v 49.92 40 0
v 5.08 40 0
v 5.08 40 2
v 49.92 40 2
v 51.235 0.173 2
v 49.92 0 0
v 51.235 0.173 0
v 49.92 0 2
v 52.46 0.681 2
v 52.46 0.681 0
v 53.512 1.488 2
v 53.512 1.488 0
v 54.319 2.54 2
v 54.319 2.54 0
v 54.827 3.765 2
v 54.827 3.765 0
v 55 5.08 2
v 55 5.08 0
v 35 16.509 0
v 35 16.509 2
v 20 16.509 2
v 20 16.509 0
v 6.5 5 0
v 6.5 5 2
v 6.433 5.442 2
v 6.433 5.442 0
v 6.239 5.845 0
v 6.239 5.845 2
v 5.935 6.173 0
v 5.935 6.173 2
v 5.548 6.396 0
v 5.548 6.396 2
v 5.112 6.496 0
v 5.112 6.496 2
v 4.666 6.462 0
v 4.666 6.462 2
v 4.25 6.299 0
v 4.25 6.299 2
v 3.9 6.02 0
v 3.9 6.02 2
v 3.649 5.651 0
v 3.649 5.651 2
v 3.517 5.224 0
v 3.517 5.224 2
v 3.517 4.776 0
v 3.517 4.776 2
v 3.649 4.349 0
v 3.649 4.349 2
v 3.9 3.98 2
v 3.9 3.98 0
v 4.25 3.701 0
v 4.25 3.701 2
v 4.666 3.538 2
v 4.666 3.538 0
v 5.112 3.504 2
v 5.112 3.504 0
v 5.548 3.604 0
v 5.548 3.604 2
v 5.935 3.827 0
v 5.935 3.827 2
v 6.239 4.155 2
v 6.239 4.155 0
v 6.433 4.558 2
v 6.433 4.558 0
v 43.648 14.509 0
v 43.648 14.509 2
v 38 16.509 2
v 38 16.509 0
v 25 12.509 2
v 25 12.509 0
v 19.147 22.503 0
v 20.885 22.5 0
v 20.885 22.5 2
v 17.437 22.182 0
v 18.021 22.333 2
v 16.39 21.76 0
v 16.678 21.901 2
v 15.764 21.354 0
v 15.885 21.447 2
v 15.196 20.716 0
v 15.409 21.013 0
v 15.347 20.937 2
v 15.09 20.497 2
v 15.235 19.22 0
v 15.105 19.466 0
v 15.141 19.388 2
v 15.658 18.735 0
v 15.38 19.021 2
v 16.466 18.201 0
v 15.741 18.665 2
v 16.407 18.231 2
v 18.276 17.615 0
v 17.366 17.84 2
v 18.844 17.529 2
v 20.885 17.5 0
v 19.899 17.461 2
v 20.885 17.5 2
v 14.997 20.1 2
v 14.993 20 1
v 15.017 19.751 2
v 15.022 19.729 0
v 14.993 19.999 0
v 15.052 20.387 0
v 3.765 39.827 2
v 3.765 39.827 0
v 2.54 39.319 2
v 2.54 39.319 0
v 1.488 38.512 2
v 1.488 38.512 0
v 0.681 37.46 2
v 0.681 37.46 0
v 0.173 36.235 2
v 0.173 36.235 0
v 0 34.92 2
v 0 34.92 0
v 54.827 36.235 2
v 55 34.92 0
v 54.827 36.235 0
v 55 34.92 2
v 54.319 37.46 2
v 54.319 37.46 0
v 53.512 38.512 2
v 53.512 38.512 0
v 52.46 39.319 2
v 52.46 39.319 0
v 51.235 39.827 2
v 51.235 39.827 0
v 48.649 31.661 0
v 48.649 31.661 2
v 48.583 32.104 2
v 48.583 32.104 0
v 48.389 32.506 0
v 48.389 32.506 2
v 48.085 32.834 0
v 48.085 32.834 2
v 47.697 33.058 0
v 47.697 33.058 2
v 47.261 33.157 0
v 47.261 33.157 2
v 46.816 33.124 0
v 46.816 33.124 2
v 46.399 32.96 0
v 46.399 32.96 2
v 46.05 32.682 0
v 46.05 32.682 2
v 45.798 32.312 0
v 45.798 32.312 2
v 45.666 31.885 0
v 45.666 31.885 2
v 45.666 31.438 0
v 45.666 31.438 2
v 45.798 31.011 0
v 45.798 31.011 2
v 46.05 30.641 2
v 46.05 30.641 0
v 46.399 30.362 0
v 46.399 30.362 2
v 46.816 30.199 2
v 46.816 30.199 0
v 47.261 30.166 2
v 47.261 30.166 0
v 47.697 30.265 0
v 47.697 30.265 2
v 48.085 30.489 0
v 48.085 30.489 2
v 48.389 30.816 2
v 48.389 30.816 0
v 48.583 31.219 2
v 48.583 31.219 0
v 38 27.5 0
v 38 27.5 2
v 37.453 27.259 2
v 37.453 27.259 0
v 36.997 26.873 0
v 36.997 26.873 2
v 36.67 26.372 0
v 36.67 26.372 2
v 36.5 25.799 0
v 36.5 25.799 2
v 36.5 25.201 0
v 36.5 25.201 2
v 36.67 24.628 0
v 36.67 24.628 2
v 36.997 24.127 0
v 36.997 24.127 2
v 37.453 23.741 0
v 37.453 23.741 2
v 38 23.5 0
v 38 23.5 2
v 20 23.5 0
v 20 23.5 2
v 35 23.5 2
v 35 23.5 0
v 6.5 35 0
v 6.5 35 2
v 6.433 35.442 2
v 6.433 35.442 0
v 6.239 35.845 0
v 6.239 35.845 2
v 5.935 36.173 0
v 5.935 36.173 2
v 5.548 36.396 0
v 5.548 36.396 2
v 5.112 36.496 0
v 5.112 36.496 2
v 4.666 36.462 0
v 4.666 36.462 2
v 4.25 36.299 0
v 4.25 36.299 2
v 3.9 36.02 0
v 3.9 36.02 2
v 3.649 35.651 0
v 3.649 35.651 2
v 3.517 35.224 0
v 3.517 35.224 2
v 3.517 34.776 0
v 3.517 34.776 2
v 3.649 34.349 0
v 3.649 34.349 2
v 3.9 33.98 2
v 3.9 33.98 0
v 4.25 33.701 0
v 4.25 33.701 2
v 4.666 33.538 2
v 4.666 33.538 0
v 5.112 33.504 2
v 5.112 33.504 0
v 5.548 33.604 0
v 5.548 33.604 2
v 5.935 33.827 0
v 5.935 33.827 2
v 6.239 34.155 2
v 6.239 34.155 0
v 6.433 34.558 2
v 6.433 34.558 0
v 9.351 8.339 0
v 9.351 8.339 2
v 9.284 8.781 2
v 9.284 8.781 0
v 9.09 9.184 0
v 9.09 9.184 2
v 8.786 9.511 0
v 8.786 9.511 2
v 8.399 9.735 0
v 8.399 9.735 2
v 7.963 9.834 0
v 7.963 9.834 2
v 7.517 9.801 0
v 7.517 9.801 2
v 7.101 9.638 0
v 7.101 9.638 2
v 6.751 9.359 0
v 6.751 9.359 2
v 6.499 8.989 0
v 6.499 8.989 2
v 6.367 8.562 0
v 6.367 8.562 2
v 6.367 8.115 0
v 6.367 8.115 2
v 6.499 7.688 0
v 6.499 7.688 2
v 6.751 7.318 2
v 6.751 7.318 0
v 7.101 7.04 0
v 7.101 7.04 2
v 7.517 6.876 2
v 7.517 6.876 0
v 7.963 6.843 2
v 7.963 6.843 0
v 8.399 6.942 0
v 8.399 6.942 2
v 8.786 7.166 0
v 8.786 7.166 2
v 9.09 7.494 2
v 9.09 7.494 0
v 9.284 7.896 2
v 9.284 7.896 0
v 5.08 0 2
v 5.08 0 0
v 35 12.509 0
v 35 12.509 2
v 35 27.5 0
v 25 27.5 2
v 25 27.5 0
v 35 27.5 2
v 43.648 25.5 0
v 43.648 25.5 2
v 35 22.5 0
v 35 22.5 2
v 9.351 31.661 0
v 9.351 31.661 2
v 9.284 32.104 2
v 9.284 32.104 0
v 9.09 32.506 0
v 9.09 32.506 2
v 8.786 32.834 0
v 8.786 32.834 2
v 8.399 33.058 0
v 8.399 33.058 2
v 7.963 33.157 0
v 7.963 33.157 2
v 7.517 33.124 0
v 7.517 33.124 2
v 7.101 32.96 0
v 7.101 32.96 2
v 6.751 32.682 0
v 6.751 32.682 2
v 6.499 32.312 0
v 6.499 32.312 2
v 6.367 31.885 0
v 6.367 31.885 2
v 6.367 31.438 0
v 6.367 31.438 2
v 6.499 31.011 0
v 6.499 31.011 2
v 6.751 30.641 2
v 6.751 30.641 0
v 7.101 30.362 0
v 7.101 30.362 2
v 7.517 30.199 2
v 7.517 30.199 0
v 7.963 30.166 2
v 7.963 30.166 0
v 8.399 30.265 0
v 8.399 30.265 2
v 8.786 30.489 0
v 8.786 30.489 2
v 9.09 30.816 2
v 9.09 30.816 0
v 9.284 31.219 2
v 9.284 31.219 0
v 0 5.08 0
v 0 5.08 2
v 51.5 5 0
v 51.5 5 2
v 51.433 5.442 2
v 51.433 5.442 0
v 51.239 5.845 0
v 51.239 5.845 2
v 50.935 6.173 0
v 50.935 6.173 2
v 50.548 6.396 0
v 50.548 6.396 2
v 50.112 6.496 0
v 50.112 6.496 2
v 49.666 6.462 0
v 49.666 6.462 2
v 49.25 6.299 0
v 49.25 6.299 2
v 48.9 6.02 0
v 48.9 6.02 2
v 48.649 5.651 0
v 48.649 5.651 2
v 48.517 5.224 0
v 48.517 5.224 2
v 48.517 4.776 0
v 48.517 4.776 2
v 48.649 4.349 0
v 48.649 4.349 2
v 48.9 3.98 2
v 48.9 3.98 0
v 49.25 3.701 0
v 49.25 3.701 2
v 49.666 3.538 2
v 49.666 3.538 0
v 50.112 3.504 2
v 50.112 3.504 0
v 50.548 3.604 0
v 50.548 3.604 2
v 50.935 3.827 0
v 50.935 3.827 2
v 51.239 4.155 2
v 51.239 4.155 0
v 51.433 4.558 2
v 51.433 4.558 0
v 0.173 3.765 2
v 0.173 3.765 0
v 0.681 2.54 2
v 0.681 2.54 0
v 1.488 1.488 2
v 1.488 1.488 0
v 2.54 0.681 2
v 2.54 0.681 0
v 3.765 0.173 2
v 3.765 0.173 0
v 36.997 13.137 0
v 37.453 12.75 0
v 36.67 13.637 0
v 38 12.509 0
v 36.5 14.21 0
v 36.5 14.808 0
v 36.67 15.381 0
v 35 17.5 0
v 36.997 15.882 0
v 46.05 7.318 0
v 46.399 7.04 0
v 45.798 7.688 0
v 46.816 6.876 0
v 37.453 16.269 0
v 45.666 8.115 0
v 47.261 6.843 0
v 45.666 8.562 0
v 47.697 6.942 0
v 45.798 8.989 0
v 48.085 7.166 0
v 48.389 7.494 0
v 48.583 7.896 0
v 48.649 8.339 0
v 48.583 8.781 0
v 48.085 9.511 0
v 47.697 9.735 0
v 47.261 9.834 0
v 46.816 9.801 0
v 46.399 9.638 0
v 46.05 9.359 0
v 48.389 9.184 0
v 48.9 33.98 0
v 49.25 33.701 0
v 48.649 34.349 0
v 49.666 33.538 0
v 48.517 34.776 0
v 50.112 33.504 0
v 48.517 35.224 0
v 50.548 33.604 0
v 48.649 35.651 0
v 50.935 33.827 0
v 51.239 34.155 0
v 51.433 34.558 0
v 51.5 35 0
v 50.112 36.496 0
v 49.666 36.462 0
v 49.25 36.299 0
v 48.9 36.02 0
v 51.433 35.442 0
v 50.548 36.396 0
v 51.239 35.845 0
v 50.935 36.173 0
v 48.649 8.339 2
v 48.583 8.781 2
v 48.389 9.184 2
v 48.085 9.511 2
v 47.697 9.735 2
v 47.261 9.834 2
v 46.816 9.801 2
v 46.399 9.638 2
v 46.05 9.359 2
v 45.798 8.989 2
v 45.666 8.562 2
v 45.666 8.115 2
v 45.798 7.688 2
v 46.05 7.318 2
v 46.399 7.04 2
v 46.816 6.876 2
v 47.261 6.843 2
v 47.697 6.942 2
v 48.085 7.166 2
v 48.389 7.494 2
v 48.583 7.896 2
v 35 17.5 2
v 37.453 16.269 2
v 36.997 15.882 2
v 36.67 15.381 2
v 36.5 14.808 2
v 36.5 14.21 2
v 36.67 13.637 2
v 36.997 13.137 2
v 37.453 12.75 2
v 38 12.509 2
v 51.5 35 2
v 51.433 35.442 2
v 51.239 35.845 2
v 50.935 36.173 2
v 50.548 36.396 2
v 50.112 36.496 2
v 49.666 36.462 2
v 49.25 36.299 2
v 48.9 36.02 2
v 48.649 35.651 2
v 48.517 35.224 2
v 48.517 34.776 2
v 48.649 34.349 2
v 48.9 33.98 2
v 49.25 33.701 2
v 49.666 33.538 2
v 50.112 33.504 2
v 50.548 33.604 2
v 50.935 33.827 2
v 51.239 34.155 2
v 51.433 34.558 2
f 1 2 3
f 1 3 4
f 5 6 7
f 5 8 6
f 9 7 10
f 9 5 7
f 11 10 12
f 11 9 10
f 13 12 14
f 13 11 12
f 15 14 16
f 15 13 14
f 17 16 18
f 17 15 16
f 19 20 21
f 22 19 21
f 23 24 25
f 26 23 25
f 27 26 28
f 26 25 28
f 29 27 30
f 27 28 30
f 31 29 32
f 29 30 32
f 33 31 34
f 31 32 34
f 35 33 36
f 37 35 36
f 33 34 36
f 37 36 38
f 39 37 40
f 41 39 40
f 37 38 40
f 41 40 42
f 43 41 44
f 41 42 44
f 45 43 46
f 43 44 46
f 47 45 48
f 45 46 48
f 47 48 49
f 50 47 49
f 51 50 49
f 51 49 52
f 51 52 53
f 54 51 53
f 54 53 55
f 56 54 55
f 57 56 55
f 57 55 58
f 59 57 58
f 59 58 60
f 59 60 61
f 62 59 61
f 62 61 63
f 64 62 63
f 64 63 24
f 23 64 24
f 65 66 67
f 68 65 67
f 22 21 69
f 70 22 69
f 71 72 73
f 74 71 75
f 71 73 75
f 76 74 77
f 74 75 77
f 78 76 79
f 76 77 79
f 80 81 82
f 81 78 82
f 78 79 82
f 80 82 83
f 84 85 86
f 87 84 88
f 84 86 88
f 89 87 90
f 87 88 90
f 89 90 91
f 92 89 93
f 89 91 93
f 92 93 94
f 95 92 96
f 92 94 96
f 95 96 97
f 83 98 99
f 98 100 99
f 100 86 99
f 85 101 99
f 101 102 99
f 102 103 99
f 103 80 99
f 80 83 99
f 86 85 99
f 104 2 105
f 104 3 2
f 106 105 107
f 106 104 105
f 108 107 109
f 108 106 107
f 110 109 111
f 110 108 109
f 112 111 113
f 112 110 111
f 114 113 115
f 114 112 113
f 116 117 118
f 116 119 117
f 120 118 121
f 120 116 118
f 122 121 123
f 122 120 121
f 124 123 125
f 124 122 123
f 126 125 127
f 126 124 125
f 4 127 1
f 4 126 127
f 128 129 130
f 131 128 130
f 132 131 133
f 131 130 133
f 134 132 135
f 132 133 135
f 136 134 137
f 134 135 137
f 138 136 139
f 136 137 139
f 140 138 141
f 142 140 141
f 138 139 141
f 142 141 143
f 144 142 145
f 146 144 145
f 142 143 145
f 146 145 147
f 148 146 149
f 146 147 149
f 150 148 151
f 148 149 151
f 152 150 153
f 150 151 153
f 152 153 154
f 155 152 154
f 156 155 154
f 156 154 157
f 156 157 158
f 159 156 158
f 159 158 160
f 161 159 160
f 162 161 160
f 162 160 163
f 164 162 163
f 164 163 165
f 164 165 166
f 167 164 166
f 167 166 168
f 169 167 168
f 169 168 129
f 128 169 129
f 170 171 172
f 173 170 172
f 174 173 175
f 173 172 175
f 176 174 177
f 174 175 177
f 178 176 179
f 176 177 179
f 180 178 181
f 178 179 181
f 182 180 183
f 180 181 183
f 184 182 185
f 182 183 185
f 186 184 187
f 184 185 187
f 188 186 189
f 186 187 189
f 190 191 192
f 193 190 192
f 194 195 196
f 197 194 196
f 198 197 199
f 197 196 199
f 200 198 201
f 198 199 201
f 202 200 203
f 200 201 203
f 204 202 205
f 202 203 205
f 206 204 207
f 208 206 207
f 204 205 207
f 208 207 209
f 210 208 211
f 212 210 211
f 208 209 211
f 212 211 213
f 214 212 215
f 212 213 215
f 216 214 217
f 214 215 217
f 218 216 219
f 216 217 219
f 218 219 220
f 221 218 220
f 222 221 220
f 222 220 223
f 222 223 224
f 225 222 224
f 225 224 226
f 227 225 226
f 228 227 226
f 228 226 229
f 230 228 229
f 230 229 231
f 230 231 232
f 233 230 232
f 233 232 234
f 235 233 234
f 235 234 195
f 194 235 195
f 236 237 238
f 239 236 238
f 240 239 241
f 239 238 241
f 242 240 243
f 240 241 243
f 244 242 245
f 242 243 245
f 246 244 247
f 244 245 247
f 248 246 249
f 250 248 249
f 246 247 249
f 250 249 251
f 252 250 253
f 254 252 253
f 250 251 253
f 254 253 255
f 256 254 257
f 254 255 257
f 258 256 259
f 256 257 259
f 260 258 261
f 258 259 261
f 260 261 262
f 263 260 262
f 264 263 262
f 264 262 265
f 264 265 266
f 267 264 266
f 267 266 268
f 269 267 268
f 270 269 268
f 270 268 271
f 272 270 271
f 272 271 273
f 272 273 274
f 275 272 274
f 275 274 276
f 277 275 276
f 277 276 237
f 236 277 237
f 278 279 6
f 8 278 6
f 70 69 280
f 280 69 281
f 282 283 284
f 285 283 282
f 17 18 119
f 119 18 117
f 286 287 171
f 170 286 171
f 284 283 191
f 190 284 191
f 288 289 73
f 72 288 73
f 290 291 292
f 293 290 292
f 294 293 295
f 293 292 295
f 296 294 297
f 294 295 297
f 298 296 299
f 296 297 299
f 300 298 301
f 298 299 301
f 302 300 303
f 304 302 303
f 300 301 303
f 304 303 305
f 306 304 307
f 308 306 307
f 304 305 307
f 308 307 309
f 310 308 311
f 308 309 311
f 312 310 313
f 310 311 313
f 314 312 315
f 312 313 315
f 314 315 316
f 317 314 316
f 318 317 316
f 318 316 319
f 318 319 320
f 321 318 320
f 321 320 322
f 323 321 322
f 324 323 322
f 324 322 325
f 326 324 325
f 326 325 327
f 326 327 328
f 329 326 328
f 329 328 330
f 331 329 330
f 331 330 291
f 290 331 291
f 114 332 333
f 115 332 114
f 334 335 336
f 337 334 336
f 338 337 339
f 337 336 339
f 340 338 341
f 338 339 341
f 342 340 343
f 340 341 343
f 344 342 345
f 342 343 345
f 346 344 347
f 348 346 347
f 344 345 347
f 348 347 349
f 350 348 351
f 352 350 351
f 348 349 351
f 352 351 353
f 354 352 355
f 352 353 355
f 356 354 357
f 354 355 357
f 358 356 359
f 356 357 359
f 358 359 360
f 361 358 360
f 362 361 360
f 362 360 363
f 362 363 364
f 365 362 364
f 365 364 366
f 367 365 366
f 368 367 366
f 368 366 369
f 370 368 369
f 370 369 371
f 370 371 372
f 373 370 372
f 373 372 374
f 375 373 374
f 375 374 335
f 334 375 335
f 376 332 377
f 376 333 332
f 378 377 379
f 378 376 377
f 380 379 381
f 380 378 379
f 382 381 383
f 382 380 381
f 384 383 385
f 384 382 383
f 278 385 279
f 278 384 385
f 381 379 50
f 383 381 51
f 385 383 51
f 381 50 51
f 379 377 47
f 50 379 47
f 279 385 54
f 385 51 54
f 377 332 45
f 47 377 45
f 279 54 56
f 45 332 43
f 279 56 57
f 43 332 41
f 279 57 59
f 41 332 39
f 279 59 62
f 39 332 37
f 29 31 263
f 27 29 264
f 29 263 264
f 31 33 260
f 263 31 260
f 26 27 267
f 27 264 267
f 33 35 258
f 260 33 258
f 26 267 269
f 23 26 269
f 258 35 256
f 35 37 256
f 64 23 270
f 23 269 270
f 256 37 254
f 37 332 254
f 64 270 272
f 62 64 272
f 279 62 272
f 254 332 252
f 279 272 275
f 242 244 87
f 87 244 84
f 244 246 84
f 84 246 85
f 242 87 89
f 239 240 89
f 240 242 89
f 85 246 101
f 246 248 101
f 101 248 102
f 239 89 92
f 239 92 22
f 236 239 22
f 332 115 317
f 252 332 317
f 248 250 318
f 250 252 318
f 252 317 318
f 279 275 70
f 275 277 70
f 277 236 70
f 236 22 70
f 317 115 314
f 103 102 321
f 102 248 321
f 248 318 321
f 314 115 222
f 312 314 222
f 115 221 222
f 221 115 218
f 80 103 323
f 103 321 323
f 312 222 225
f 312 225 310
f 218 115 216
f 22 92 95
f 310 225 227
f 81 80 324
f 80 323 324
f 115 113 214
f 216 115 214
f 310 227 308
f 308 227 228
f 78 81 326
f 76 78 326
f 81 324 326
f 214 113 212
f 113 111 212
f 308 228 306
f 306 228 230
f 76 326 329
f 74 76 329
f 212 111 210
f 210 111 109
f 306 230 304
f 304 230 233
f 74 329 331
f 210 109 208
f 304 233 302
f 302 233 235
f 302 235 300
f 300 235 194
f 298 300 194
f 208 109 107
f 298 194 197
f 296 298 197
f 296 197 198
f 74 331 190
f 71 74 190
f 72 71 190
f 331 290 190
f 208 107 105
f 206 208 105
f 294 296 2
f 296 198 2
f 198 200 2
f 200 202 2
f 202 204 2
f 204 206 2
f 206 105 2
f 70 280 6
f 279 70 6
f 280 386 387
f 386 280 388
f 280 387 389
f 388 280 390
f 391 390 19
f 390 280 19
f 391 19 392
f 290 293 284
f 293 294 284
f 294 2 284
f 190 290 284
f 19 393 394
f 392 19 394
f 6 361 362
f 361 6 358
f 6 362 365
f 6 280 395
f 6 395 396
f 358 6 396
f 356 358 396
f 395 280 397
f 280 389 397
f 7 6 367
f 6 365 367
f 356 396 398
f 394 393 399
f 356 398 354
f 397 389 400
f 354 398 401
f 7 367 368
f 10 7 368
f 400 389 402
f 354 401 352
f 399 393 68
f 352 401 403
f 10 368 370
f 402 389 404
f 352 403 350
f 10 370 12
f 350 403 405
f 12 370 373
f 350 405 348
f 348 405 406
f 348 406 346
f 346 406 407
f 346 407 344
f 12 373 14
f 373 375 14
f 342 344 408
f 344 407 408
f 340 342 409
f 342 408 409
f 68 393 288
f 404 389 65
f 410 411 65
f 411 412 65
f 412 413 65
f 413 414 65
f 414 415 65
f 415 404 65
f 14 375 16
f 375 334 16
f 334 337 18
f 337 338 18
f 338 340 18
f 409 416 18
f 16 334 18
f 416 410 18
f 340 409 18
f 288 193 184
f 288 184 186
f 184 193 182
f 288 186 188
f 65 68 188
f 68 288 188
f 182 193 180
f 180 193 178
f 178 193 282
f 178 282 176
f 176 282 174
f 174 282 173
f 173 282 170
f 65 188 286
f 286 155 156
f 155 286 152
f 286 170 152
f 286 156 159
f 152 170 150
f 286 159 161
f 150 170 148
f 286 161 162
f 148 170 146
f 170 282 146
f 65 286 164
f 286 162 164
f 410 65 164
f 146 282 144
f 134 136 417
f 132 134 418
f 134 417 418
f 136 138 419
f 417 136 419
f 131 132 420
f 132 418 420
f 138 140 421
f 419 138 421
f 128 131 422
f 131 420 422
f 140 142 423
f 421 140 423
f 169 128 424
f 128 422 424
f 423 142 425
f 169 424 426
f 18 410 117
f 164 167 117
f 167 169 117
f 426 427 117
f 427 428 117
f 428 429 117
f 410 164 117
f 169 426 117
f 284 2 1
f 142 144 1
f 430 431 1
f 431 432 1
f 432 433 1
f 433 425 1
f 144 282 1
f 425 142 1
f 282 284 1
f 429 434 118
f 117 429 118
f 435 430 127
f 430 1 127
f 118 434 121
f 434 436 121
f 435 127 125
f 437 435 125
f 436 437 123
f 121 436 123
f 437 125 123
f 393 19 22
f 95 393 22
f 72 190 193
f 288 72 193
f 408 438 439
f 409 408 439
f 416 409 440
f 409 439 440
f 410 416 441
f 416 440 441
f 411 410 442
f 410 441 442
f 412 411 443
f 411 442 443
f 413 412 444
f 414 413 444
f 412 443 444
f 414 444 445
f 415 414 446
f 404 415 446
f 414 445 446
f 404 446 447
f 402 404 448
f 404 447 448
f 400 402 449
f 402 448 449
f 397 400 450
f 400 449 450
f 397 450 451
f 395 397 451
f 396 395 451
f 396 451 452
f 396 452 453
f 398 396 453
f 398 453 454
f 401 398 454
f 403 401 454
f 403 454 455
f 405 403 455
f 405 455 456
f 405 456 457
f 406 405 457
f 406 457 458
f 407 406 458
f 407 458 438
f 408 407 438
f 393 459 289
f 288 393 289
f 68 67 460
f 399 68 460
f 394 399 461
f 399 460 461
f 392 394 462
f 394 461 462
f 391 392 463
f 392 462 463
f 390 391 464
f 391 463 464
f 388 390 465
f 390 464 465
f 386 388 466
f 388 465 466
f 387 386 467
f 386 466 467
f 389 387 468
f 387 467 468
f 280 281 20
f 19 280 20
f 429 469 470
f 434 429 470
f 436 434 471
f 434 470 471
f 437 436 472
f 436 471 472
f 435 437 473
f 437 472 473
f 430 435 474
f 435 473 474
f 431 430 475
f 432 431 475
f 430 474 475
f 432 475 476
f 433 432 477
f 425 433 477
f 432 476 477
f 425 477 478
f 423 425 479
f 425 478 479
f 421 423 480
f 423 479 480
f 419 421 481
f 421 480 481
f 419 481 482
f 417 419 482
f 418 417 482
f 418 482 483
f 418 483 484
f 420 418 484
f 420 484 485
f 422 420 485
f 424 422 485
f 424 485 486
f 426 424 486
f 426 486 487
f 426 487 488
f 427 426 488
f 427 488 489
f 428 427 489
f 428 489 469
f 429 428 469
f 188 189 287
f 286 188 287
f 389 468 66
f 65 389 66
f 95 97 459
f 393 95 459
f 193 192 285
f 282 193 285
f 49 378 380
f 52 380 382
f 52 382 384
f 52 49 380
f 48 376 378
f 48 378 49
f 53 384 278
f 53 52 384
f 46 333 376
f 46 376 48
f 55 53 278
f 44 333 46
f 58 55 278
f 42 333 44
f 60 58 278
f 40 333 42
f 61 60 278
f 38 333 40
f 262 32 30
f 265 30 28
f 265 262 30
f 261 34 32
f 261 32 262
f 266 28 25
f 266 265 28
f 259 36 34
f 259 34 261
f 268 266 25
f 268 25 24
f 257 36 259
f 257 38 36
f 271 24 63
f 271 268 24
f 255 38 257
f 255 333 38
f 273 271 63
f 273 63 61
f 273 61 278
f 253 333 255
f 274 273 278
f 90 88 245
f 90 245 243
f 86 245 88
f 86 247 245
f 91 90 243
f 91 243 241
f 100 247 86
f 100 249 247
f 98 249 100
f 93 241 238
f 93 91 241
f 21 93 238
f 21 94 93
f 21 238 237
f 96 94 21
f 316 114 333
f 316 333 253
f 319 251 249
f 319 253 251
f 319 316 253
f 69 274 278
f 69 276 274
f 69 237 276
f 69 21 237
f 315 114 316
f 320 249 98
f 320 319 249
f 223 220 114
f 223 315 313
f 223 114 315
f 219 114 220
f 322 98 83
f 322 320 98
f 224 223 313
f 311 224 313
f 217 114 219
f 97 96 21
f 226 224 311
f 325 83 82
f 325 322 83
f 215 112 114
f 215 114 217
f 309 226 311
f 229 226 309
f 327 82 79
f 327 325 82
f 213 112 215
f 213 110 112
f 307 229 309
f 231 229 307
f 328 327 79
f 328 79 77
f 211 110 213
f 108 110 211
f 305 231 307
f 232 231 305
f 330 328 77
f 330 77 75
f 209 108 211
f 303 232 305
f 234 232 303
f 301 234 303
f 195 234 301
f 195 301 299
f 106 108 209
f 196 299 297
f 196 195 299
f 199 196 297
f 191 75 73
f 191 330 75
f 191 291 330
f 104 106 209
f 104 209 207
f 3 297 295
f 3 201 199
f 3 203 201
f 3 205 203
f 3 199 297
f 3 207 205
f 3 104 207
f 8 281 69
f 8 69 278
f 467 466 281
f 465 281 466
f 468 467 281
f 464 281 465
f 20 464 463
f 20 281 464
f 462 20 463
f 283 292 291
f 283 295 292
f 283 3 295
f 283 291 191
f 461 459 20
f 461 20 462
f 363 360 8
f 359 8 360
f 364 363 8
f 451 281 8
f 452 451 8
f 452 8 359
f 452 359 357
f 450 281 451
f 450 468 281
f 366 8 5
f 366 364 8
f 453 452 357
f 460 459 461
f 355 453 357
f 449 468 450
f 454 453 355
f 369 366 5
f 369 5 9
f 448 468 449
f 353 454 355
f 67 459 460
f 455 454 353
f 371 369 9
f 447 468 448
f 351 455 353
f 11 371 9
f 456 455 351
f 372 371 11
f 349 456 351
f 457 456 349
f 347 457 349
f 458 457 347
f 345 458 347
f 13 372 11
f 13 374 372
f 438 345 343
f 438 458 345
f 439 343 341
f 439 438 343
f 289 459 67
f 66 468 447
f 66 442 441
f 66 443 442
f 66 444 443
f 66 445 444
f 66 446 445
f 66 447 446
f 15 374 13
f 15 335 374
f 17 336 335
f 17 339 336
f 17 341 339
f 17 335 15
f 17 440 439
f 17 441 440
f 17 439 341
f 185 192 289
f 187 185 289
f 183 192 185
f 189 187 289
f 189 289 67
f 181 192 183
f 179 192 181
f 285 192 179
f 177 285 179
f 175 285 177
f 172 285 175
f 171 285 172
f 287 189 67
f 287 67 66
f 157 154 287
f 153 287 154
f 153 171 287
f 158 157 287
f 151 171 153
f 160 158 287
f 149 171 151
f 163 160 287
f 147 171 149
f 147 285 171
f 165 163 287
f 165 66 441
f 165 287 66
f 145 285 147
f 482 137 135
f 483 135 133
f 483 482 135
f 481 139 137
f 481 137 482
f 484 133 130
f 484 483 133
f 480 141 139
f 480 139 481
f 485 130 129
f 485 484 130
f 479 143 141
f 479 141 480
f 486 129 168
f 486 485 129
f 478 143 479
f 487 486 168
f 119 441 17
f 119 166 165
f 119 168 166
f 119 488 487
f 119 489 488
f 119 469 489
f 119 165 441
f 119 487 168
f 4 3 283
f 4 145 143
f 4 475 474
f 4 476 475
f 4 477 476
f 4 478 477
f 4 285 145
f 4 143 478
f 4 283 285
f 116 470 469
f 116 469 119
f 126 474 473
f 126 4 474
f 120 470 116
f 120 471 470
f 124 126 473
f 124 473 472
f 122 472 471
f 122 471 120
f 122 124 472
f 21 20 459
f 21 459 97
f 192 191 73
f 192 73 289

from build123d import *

# Parameters (mm, degrees)
F0_W      = 55
F0_H      = 40
F1_DEPTH  = 2
F3_R      = 5.08
F4_R      = 5.08
F5_R      = 5.08
F6_R      = 5.08
F8_R      = 1.5
F9_DEPTH  = 25.4
F10_W     = 10
F10_H     = 4
F11_DEPTH = 25.4


with BuildPart() as f1:
    # F0 (on Top) → F1 (new body)
    with BuildSketch(Plane.XY):
        with Locations((27.5, 20)):
            Rectangle(F0_W, F0_H)
    extrude(amount=F1_DEPTH)

    # F3
    f3_edges = [f1.edges().sort_by_distance(p)[0] for p in [
        (55, 0, 1),
    ]]
    fillet(f3_edges, radius=F3_R)

    # F4
    f4_edges = [f1.edges().sort_by_distance(p)[0] for p in [
        (55, 40, 1),
    ]]
    fillet(f4_edges, radius=F4_R)

    # F5
    f5_edges = [f1.edges().sort_by_distance(p)[0] for p in [
        (0, 40, 1),
    ]]
    fillet(f5_edges, radius=F5_R)

    # F6
    f6_edges = [f1.edges().sort_by_distance(p)[0] for p in [
        (0, 0, 1),
    ]]
    fillet(f6_edges, radius=F6_R)

    # F8 (on offset) → F9 (cut)
    with BuildSketch(Plane.XY.offset(2)):
        with Locations((50, 5)):
            Circle(F8_R)
        with Locations((47.1494022449, 8.3385913854)):
            Circle(F8_R)
        with Locations((47.1494022449, 31.6614086146)):
            Circle(F8_R)
        with Locations((50, 35)):
            Circle(F8_R)
        with Locations((7.8505977551, 31.6614086146)):
            Circle(F8_R)
        with Locations((5, 35)):
            Circle(F8_R)
        with Locations((7.8505977551, 8.3385913854)):
            Circle(F8_R)
        with Locations((5, 5)):
            Circle(F8_R)
    extrude(amount=-F9_DEPTH, mode=Mode.SUBTRACT)

    # F10 (on face) → F11 (cut)
    with BuildSketch(Plane.XY.offset(2)):
        with BuildLine():
            Line((20, 17.5), (20, 22.5))
            Line((20, 22.5), (20.8850657517, 22.5))
            add(Edge.make_bspline(
                [(20.8850657517, 22.5), (14.9931568267, 23.0368228686), (14.9931568267, 20)],
                knots=[4.5346839474, 4.5346839474, 4.5346839474, 6.2831853072, 6.2831853072, 6.2831853072], degree=2, weights=[1, 0.6415718139, 1]))
            add(Edge.make_bspline(
                [(14.9931568267, 20), (14.9931568267, 16.9631771314), (20.8850657517, 17.5)],
                knots=[0, 0, 0, 1.7485013598, 1.7485013598, 1.7485013598], degree=2, weights=[1, 0.6415718139, 1]))
            Line((20.8850657517, 17.5), (20, 17.5))
        make_face()
        with BuildLine():
            Line((20.8850657517, 22.5), (20, 22.5))
            Line((20, 22.5), (20, 17.5))
            Line((20, 17.5), (20.8850657517, 17.5))
            add(Edge.make_bspline(
                [(20.8850657517, 17.5), (25.0068431733, 17.8755428686), (25.0068431733, 20), (25.0068431733, 22.1244571314), (20.8850657517, 22.5)],
                knots=[1.7485013598, 1.7485013598, 1.7485013598, 3.1415926536, 3.1415926536, 4.5346839474, 4.5346839474, 4.5346839474], degree=2, weights=[1, 0.767062975, 1, 0.767062975, 1]))
        make_face()
        with BuildLine():
            Line((35, 22.5), (20.8850657517, 22.5))
            add(Edge.make_bspline(
                [(20.8850657517, 17.5), (25.0068431733, 17.8755428686), (25.0068431733, 20), (25.0068431733, 22.1244571314), (20.8850657517, 22.5)],
                knots=[1.7485013598, 1.7485013598, 1.7485013598, 3.1415926536, 3.1415926536, 4.5346839474, 4.5346839474, 4.5346839474], degree=2, weights=[1, 0.767062975, 1, 0.767062975, 1]))
            Line((20.8850657517, 17.5), (35, 17.5))
            Line((35, 17.5), (35, 22.5))
        make_face()
        with Locations((30, 25.5)):
            Rectangle(F10_W, F10_H)
        Polygon((25, 23.5), (25, 27.5), (20, 23.5), align=None)
        Polygon((20, 16.5094), (25, 12.5094), (25, 16.5094), align=None)
        with Locations((30, 14.5094)):
            Rectangle(F10_W, F10_H)
        with BuildLine():
            Line((43.6482731998, 25.5), (38, 27.5))
            ThreePointArc((38, 27.5), (36.4781820371, 25.5), (38, 23.5))
            Line((38, 23.5), (43.6482731998, 25.5))
        make_face()
        with BuildLine():
            ThreePointArc((38, 16.5094), (36.4781820371, 14.5094), (38, 12.5094))
            Line((38, 12.5094), (43.6482731998, 14.5094))
            Line((43.6482731998, 14.5094), (38, 16.5094))
        make_face()
    extrude(amount=-F11_DEPTH, mode=Mode.SUBTRACT)


solid = f1.part
